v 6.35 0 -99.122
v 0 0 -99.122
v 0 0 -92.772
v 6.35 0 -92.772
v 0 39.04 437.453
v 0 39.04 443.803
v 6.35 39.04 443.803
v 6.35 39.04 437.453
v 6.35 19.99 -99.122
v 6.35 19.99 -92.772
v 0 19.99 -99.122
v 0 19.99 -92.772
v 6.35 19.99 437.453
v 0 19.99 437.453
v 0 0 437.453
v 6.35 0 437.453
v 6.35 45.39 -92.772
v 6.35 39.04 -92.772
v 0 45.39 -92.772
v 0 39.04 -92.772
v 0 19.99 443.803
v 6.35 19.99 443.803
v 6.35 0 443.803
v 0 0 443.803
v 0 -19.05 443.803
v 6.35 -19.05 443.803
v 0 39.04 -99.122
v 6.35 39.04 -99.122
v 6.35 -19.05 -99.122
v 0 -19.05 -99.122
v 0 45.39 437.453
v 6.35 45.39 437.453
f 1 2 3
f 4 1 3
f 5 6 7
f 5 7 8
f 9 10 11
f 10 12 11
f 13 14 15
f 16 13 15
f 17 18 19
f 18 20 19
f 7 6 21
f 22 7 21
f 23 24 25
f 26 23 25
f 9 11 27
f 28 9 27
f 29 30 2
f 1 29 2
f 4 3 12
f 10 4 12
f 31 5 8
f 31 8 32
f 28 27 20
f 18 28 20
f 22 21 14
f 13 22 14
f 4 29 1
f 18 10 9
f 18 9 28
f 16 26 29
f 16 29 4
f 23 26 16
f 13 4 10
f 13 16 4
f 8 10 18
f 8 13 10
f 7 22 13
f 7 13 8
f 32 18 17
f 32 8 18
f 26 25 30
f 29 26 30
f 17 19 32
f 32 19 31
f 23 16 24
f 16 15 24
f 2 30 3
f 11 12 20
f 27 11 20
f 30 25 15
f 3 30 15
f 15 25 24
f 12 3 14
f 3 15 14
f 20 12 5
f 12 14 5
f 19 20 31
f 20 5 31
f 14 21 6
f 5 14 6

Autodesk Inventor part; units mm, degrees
ref_plane "YZ Plane" through (0, 0, 0) normal (1, 0, 0) x (0, 1, 0)
ref_plane "XZ Plane" through (0, 0, 0) normal (0, 1, 0) x (-1, 0, 0)
ref_plane "XY Plane" through (0, 0, 0) normal (0, 0, 1) x (1, 0, 0)
sketch "Sketch1" plane through (0, 0, 0) normal (1, 0, 0) x (0, 1, 0)
  line L0 (-19.05, 443.8029) -> (-19.05, -99.1221)
  line L1 (45.3898, -92.7721) -> (45.3898, 437.4529)
  line L2 (19.9898, 443.8029) -> (19.9898, 437.4529)
  line L3 (19.9898, 437.4529) -> (0, 437.4529)
  line L4 (0, 437.4529) -> (0, 443.8029)
  line L5 (39.0398, 443.8029) -> (39.0398, 437.4529)
  line L6 (39.0398, 437.4529) -> (45.3898, 437.4529)
  line L7 (39.0398, -99.1221) -> (39.0398, -92.7721)
  line L8 (39.0398, -92.7721) -> (45.3898, -92.7721)
  line L9 (0, -99.1221) -> (0, -92.7721)
  line L10 (0, -92.7721) -> (19.9898, -92.7721)
  line L11 (19.9898, -92.7721) -> (19.9898, -99.1221)
  line L12 (39.0398, 443.8029) -> (19.9898, 443.8029)
  line L13 (0, 443.8029) -> (-19.05, 443.8029)
  line L14 (-19.05, -99.1221) -> (0, -99.1221)
  line L15 (19.9898, -99.1221) -> (39.0398, -99.1221)
  point P0 (0, 0)
  dimension "d12" = 6.35
  dimension "d13" = 6.35
  dimension "d14" = 19.05
  dimension "d15" = 19.9898
  dimension "d16" = 6.35
  dimension "d17" = 64.4398
  dimension "d18" = 6.35
  dimension "d19" = 6.35
  dimension "d20" = 19.05
  dimension "d21" = 19.9898
  dimension "d22" = 6.35
  dimension "d23" = 542.925
  dimension "d26" = 6.35
extrude "Extrusion1" add sketch "Sketch1" along normal blind 6.35
properties part number "Front V3"
